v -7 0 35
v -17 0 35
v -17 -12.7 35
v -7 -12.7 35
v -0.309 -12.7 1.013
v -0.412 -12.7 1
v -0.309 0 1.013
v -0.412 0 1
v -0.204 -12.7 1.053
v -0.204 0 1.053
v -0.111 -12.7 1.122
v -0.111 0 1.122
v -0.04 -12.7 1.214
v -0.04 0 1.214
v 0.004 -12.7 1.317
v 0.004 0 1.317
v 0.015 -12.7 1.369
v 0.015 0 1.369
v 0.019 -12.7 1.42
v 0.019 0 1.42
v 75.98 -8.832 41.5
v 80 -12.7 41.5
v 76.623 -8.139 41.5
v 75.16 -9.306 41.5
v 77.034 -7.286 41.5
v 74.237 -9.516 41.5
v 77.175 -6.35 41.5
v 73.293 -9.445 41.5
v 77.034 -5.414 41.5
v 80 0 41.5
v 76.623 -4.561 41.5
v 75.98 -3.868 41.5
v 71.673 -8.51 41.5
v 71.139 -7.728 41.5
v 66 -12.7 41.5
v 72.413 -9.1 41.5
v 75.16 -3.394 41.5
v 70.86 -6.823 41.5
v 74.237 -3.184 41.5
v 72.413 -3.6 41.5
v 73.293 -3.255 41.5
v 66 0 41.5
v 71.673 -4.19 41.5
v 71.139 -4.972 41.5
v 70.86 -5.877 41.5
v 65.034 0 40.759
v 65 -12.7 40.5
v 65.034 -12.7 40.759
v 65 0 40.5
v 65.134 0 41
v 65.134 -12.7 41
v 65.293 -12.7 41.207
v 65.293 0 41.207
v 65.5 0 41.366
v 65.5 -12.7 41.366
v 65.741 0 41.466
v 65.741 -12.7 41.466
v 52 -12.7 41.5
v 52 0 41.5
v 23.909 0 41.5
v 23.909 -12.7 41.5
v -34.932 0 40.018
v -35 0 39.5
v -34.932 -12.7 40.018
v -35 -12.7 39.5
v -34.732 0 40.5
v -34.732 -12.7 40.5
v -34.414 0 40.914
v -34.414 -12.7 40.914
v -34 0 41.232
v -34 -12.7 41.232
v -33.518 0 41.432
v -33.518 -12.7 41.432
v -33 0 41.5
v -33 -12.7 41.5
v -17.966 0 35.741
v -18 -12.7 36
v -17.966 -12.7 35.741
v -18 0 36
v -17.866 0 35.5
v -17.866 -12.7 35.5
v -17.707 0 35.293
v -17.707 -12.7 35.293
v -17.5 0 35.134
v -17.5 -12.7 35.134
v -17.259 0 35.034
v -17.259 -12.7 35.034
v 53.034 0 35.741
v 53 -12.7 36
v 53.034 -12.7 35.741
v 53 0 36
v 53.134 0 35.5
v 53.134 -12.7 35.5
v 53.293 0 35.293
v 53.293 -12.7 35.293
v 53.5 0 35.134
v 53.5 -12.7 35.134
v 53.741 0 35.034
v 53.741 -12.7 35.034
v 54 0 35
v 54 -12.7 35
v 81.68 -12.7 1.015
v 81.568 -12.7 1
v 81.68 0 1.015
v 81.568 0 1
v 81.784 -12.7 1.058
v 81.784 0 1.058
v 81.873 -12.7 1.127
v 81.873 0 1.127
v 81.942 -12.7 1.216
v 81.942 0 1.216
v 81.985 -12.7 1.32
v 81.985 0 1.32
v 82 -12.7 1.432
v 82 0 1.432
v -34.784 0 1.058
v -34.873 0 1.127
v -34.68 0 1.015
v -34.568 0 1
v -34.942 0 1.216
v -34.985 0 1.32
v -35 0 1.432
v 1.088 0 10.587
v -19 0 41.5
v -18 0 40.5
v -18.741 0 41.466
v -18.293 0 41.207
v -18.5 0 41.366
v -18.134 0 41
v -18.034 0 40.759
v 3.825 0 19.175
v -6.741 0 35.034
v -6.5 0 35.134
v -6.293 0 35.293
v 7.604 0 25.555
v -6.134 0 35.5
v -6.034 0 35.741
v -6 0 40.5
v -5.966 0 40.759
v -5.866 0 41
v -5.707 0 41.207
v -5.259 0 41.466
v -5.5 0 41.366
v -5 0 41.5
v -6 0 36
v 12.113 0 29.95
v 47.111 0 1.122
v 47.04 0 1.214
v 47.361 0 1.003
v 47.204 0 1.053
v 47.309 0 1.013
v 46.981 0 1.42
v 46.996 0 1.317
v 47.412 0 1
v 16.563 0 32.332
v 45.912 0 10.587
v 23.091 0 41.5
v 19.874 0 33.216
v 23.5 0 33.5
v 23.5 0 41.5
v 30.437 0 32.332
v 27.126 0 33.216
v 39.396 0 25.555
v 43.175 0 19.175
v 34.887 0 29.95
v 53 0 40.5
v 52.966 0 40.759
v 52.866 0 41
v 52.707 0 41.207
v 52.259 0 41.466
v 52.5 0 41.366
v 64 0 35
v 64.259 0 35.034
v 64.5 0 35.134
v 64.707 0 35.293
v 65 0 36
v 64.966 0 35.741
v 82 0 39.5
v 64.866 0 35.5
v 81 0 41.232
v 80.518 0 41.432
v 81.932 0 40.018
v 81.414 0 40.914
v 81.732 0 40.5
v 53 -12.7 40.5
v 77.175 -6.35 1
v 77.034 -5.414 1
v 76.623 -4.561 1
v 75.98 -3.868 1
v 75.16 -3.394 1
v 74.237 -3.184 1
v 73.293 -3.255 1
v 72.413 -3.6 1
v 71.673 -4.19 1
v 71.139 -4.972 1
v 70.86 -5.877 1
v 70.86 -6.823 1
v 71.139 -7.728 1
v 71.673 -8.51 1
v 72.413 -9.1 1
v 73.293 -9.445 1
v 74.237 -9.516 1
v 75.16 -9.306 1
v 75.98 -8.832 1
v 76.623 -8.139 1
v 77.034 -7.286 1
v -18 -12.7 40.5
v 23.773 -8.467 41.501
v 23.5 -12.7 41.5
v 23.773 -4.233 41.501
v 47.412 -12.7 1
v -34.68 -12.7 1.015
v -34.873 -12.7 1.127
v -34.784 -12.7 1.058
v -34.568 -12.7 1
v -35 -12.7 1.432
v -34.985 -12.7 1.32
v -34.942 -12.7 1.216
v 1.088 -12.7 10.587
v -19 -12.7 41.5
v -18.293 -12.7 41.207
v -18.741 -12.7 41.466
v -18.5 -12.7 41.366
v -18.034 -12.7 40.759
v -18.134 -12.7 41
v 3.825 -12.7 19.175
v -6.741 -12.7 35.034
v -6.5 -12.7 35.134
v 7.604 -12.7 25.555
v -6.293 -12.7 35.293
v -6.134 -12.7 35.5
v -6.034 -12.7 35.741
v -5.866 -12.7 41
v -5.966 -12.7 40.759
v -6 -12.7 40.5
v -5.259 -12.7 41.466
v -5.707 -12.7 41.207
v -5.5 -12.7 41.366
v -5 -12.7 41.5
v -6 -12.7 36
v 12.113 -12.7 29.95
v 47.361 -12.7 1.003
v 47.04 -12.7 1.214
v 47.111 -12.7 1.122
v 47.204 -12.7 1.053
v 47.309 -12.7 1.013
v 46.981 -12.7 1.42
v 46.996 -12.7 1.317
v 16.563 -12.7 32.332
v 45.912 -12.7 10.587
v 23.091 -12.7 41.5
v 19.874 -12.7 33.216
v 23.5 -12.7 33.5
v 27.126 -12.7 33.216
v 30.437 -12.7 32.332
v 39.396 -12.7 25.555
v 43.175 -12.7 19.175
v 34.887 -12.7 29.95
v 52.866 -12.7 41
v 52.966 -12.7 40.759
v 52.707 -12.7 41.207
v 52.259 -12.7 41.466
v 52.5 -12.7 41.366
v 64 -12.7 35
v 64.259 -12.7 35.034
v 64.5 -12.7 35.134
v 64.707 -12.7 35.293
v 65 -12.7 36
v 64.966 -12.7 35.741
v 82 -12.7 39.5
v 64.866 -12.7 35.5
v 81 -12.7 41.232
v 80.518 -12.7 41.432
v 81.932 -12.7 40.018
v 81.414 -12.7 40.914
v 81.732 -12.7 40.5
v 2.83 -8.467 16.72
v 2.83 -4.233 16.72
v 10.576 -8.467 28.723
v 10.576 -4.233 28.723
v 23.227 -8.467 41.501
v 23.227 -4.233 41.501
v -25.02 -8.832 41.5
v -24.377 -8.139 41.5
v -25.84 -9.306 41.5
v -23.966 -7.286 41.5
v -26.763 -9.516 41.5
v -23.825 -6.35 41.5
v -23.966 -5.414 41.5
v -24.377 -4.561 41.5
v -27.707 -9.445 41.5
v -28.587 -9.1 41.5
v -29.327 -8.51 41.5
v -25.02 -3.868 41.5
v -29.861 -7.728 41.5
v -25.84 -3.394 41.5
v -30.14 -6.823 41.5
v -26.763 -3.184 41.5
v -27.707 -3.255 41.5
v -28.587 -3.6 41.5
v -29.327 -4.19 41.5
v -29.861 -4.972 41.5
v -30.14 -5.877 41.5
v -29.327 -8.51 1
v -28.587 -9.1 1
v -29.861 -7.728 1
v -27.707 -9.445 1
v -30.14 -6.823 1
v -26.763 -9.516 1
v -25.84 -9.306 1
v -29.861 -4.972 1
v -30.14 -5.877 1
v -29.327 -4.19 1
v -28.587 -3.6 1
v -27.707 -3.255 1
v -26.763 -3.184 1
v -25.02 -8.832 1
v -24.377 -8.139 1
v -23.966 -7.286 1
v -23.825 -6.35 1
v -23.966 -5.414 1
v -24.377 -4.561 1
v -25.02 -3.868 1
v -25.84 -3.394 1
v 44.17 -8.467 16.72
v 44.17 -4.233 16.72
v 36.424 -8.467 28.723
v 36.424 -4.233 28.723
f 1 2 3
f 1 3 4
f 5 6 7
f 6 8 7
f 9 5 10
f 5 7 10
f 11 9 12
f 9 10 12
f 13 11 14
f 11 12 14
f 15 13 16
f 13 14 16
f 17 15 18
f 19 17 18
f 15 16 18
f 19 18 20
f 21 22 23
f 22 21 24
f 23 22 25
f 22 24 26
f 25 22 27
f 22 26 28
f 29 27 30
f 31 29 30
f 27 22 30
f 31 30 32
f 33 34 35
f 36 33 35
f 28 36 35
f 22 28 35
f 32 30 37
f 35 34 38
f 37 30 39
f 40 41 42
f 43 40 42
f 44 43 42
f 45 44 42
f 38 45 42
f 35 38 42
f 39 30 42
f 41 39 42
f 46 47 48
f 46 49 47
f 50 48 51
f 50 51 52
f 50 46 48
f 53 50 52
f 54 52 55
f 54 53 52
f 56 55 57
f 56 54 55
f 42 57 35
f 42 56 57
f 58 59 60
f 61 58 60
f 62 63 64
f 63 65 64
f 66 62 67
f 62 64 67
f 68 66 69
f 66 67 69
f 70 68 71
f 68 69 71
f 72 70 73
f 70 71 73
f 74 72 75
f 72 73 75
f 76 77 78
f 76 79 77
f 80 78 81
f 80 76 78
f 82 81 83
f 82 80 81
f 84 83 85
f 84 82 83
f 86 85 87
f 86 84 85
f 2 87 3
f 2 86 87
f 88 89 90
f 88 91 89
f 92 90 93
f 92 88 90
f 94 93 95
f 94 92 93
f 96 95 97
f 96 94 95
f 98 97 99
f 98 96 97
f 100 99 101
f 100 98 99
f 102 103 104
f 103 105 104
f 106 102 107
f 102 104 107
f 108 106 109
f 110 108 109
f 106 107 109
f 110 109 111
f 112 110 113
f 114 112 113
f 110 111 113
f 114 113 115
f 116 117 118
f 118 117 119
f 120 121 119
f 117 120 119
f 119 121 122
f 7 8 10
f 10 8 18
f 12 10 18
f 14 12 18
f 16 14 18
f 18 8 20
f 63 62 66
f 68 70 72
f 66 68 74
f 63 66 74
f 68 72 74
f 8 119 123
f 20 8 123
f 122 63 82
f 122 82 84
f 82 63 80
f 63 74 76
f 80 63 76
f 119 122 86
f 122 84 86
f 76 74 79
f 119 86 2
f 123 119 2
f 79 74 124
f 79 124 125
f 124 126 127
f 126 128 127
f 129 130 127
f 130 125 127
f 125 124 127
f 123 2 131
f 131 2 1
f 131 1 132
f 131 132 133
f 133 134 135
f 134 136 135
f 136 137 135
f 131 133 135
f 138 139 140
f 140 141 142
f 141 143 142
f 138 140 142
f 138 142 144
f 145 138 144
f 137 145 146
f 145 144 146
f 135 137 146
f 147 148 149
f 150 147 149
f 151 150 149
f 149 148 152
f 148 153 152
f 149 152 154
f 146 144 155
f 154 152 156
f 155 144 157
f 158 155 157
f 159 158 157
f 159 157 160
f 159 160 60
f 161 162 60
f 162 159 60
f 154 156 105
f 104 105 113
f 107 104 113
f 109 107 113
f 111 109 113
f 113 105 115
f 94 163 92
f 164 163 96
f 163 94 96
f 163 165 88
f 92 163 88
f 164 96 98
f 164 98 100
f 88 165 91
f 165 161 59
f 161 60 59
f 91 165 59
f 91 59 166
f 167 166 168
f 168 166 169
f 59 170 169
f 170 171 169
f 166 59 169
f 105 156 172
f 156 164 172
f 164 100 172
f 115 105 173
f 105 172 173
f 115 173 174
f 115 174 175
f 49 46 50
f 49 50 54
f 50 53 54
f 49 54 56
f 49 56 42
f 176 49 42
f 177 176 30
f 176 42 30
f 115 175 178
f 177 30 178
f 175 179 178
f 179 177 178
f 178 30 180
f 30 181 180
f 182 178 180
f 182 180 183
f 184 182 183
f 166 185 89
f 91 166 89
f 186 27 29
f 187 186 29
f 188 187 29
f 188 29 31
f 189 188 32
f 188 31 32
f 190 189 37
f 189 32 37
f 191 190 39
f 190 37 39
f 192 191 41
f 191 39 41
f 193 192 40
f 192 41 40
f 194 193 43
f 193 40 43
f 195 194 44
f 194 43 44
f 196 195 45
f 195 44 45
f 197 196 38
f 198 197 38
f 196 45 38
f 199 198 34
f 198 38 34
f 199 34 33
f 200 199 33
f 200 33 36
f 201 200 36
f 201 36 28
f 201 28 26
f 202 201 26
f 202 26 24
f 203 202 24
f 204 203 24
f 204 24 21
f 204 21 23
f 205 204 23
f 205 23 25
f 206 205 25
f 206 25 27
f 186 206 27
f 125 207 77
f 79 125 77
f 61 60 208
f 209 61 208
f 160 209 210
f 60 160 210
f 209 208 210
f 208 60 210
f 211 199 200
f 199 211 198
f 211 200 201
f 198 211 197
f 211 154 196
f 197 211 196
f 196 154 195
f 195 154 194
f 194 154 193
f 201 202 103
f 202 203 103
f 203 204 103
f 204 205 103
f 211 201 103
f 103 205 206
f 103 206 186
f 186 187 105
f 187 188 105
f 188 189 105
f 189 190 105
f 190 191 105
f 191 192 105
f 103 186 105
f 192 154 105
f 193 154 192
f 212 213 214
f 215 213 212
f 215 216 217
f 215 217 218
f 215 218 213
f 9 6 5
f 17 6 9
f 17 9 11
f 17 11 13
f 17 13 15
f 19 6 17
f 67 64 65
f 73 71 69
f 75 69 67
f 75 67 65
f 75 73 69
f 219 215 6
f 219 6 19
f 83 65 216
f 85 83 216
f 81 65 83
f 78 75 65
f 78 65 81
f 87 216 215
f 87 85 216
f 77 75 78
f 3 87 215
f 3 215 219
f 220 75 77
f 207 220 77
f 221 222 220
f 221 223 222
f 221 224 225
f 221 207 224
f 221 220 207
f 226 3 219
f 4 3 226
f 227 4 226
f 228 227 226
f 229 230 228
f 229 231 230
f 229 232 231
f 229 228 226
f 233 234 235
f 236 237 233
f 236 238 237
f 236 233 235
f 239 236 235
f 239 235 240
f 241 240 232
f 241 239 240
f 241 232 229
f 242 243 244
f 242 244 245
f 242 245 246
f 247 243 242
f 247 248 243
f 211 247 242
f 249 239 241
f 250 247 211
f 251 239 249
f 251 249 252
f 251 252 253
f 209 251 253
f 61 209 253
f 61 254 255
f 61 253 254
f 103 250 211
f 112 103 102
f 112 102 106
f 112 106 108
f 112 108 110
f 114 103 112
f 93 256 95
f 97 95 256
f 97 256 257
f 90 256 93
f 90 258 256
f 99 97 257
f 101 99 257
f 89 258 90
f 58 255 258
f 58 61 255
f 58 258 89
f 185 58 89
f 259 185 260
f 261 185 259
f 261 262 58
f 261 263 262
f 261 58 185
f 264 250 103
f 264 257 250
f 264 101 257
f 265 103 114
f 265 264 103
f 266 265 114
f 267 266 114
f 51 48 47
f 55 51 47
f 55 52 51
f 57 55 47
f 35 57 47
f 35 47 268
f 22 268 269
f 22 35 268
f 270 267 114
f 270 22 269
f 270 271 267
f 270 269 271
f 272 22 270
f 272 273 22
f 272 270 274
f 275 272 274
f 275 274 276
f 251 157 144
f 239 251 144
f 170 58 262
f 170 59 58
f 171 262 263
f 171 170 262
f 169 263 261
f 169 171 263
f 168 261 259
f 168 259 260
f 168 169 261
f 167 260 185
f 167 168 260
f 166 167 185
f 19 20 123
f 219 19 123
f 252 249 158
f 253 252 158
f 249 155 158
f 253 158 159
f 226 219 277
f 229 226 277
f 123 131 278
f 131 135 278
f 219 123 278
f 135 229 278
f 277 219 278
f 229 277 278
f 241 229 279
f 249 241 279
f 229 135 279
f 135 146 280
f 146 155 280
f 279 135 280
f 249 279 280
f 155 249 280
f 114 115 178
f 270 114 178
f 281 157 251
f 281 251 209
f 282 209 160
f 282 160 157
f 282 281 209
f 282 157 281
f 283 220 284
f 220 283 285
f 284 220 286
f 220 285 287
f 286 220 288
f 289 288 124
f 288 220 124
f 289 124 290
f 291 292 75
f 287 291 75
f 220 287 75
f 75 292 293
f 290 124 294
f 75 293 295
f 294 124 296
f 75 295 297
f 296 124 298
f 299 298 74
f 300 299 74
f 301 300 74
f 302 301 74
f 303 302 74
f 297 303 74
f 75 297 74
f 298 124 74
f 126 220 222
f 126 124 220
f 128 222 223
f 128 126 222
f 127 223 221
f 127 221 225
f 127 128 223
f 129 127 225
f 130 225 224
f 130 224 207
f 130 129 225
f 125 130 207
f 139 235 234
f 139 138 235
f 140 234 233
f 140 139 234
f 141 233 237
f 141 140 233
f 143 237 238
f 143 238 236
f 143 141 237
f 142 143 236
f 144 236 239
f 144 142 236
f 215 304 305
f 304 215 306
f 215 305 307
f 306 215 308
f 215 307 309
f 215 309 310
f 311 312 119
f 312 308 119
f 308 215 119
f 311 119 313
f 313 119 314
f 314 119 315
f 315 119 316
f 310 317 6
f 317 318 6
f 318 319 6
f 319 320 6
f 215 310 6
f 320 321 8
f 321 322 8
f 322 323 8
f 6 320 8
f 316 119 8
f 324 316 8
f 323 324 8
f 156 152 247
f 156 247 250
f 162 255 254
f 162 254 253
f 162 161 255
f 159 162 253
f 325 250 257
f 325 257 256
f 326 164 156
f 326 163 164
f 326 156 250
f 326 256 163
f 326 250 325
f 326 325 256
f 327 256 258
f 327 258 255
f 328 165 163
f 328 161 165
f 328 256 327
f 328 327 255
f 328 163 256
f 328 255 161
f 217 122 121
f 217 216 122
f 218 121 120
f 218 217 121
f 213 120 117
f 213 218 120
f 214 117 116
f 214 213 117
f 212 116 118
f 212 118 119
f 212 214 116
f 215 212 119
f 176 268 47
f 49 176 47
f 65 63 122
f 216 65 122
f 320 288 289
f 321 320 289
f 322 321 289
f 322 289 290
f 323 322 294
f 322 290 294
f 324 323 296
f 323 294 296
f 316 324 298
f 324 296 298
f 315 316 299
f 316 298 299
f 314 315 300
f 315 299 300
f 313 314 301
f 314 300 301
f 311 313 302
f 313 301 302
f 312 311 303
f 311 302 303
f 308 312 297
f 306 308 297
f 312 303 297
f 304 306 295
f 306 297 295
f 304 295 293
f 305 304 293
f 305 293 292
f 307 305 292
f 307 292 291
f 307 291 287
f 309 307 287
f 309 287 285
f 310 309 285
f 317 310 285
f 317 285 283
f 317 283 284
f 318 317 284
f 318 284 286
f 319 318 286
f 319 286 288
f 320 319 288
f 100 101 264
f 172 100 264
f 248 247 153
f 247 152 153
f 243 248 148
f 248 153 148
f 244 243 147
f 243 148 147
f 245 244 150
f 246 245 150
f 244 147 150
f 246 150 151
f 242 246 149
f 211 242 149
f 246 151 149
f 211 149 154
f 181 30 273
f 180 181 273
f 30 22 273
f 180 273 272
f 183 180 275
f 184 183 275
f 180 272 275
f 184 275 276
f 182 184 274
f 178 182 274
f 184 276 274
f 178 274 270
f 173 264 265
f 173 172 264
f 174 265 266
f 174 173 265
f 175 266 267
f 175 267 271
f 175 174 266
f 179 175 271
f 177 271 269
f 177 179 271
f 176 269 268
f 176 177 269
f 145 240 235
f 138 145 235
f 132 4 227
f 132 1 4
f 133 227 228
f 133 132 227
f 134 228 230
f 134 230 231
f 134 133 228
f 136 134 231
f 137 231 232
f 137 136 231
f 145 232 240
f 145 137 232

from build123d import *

# Parameters (mm, degrees)
F1_DEPTH = 12.7
F2_R     = 3.175
F3_DEPTH = 41.5002601562
F4_W     = 130.419023335
F4_H     = 4.1049833633
F5_DEPTH = 25
F6_R     = 2
F7_R     = 0.432
F9_DEPTH = 12.7
F10_R    = 1


# Not quite as in the source:
# - ends of sketch curves that miss each other by under 0.0002 mm in the source are joined
# - the dataset's text gives a spline's control points without its knots; the knots are read off the source's solid


with BuildPart() as f1:
    # F0 (on Front) → F1 (new body)
    with BuildSketch(Plane.XZ):
        with BuildLine():
            Line((-8, 0), (0, 0))
            add(Edge.make_bspline(
                [(0, 0), (0, 16.0348825157), (7.430841215, 33.6514413357), (23.5, 33.5)],
                knots=[0, 0, 0, 0, 40.9206549312, 40.9206549312, 40.9206549312, 40.9206549312], degree=3))
            add(Edge.make_bspline(
                [(47, 0), (47, 16.0348825157), (39.569158785, 33.6514413357), (23.5, 33.5)],
                knots=[0, 0, 0, 0, 40.9206549312, 40.9206549312, 40.9206549312, 40.9206549312], degree=3))
            Line((47, 0), (55, 0))
            add(Edge.make_bspline(
                [(55, 0), (55, 2.3133051501), (54.8084752548, 5.6604865088), (54.3346414744, 8.9941225704), (54.1644875118, 10.0000161913)],
                knots=[0, 0, 0, 0, 0.125, 0.1792883855, 0.1792883855, 0.1792883855, 0.1792883855], degree=3))
            add(Edge.make_bspline(
                [(54.1644875118, 10.0000161913), (53.9428588652, 11.3102110198), (53.2041802455, 14.9199242801), (51.403557473, 20.6965522199), (48.312647429, 27.0635606249), (44.7757382973, 31.8590791464), (41.27501086, 35.2044913237), (38.3020149436, 37.39930019), (34.9881581098, 39.2038242784), (31.3670929719, 40.5407901401), (27.6491274865, 41.3170292606), (25.11417344, 41.4919330376), (23.9092731988, 41.5002601562)],
                knots=[0.1792883855, 0.1792883855, 0.1792883855, 0.1792883855, 0.25, 0.375, 0.5, 0.625, 0.6875, 0.75, 0.8125, 0.875, 0.9375, 0.9926226885, 0.9926226885, 0.9926226885, 0.9926226885], degree=3))
            Line((23.9092731988, 41.5002601562), (23.5, 41.5002601562))
            Line((23.5, 41.5002601562), (23.0907268012, 41.5002601562))
            add(Edge.make_bspline(
                [(-7.1644875118, 10.0000161913), (-6.9428588652, 11.3102110198), (-6.2041802455, 14.9199242801), (-4.403557473, 20.6965522199), (-1.312647429, 27.0635606249), (2.2242617027, 31.8590791464), (5.72498914, 35.2044913237), (8.6979850564, 37.39930019), (12.0118418902, 39.2038242784), (15.6329070281, 40.5407901401), (19.3508725135, 41.3170292606), (21.88582656, 41.4919330376), (23.0907268012, 41.5002601562)],
                knots=[0.1792883855, 0.1792883855, 0.1792883855, 0.1792883855, 0.25, 0.375, 0.5, 0.625, 0.6875, 0.75, 0.8125, 0.875, 0.9375, 0.9926226885, 0.9926226885, 0.9926226885, 0.9926226885], degree=3))
            add(Edge.make_bspline(
                [(-8, 0), (-8, 2.3133051501), (-7.8084752548, 5.6604865088), (-7.3346414744, 8.9941225704), (-7.1644875118, 10.0000161913)],
                knots=[0, 0, 0, 0, 0.125, 0.1792883855, 0.1792883855, 0.1792883855, 0.1792883855], degree=3))
        make_face()
        with BuildLine():
            Line((-35, 0), (-8, 0))
            add(Edge.make_bspline(
                [(-8, 0), (-8, 2.3133051501), (-7.8084752548, 5.6604865088), (-7.3346414744, 8.9941225704), (-7.1644875118, 10.0000161913)],
                knots=[0, 0, 0, 0, 0.125, 0.1792883855, 0.1792883855, 0.1792883855, 0.1792883855], degree=3))
            Line((-7.1644875118, 10.0000161913), (-35, 10))
            Line((-35, 10), (-35, 0))
        make_face()
        with BuildLine():
            Line((-35, 10), (-7.1643917939, 10))
            add(Edge.make_bspline(
                [(-7.1643917939, 10), (-6.9428588652, 11.3102110198), (-6.2041802455, 14.9199242801), (-4.403557473, 20.6965522199), (-1.312647429, 27.0635606249), (2.2242617027, 31.8590791464), (5.72498914, 35.2044913237), (8.6979850564, 37.39930019), (12.0118418902, 39.2038242784), (15.6329070281, 40.5407901401), (19.3508725135, 41.3170292606), (21.88582656, 41.4919330376), (23.0907268012, 41.5002601562)],
                knots=[0.1792883855, 0.1792883855, 0.1792883855, 0.1792883855, 0.25, 0.375, 0.5, 0.625, 0.6875, 0.75, 0.8125, 0.875, 0.9375, 0.9926226885, 0.9926226885, 0.9926226885, 0.9926226885], degree=3))
            Line((23.0907268012, 41.5002601562), (-12, 41.5002601562))
            Line((-12, 41.5002601562), (-12, 38.0002601562))
            Line((-12, 38.0002601562), (-15, 38.0002601562))
            Line((-15, 38.0002601562), (-18, 38.0002601562))
            Line((-18, 38.0002601562), (-18, 41.5002601562))
            Line((-18, 41.5002601562), (-35, 41.5002601562))
            Line((-35, 41.5002601562), (-35, 10))
        make_face()
        with BuildLine():
            add(Edge.make_bspline(
                [(55, 0), (55, 2.3133051501), (54.8084752548, 5.6604865088), (54.3346414744, 8.9941225704), (54.1644875118, 10.0000161913)],
                knots=[0, 0, 0, 0, 0.125, 0.1792883855, 0.1792883855, 0.1792883855, 0.1792883855], degree=3))
            Line((55, 0), (82, 0))
            Line((82, 0), (82, 10))
            Line((82, 10), (54.1644875118, 10.0000161913))
        make_face()
        with BuildLine():
            add(Edge.make_bspline(
                [(23.0907268012, 41.5002601562), (23.2269381476, 41.5012015188), (23.3633657228, 41.5012017791), (23.499999998, 41.5002598872)],
                knots=[0.9926226885, 0.9926226885, 0.9926226885, 0.9926226885, 0.9988541884, 0.9988541884, 0.9988541884, 0.9988541884], degree=3))
            Line((23.0907268012, 41.5002601562), (23.499999998, 41.5002598872))
        make_face()
        with BuildLine():
            add(Edge.make_bspline(
                [(54.1644875118, 10.0000161913), (53.9428588652, 11.3102110198), (53.2041802455, 14.9199242801), (51.403557473, 20.6965522199), (48.312647429, 27.0635606249), (44.7757382973, 31.8590791464), (41.27501086, 35.2044913237), (38.3020149436, 37.39930019), (34.9881581098, 39.2038242784), (31.3670929719, 40.5407901401), (27.6491274865, 41.3170292606), (25.11417344, 41.4919330376), (23.9092731988, 41.5002601562)],
                knots=[0.1792883855, 0.1792883855, 0.1792883855, 0.1792883855, 0.25, 0.375, 0.5, 0.625, 0.6875, 0.75, 0.8125, 0.875, 0.9375, 0.9926226885, 0.9926226885, 0.9926226885, 0.9926226885], degree=3))
            Line((54.1644875118, 10.0000161913), (82, 10))
            Line((82, 10), (82, 41.5002601562))
            Line((82, 41.5002601562), (23.9092731988, 41.5002601562))
        make_face()
        with BuildLine():
            add(Edge.make_bspline(
                [(23.9092731988, 41.5002601562), (23.7730618524, 41.5012015188), (23.6366342772, 41.5012017791), (23.500000002, 41.5002598872)],
                knots=[0.9926226885, 0.9926226885, 0.9926226885, 0.9926226885, 0.9988541884, 0.9988541884, 0.9988541884, 0.9988541884], degree=3))
            Line((23.500000002, 41.5002598872), (23.9092731988, 41.5002601562))
        make_face()
        Polygon((-12, 38.0002601562), (-12, 41.5002601562), (-15, 41.5002601562), (-18, 41.5002601562), (-18, 38.0002601562), (-15, 38.0002601562), align=None)
    extrude(amount=F1_DEPTH)

    # F2 (on face) → F3 (cut, through all)
    with BuildSketch(Plane.XY.offset(41.5002601562)):
        with Locations((-26.999999998, -6.35)):
            Circle(F2_R)
        with Locations((74.000000002, -6.35)):
            Circle(F2_R)
    extrude(amount=-F3_DEPTH, mode=Mode.SUBTRACT)

    # F4 (on Front) → F5 (cut)
    with BuildSketch(Plane.XZ):
        with Locations((22.7671675384, -1.0524916817)):
            Rectangle(F4_W, F4_H)
    extrude(amount=F5_DEPTH, mode=Mode.SUBTRACT)

    # F6
    f6_edges = [f1.edges().sort_by_distance(p)[0] for p in [
        (82, -6.35, 41.50026),
        (-35, -6.35, 41.50026),
    ]]
    fillet(f6_edges, radius=F6_R)

    # F7
    f7_edges = [f1.edges().sort_by_distance(p)[0] for p in [
        (-35, -6.35, 1),
        (0.009608, -6.35, 1),
        (46.990392, -6.35, 1),
        (82, -6.35, 1),
    ]]
    fillet(f7_edges, radius=F7_R)

    # F8 (on face) → F9 (cut, through all)
    with BuildSketch(Plane.XZ.offset(12.7)):
        Polygon((-18, 35.0002601562), (-12, 35.0002601562), (-6, 35.0002601562), (-6, 41.5002601562), (-12, 41.5002601562), (-18, 41.5002601562), align=None)
        Polygon((59.0000000039, 35.0002601562), (65.0000000039, 35.0002601562), (65.0000000039, 41.5002601562), (59.0000000039, 41.5002601562), (53.0000000039, 41.5002601562), (53.0000000039, 35.0002601562), align=None)
    extrude(amount=-F9_DEPTH, mode=Mode.SUBTRACT)

    # F10
    f10_edges = [f1.edges().sort_by_distance(p)[0] for p in [
        (-18, -6.35, 35.00026),
        (-6, -6.35, 35.00026),
        (-18, -6.35, 41.50026),
        (-6, -6.35, 41.50026),
        (53, -6.35, 35.00026),
        (53, -6.35, 41.50026),
        (65, -6.35, 35.00026),
        (65, -6.35, 41.50026),
    ]]
    fillet(f10_edges, radius=F10_R)


solid = f1.part
